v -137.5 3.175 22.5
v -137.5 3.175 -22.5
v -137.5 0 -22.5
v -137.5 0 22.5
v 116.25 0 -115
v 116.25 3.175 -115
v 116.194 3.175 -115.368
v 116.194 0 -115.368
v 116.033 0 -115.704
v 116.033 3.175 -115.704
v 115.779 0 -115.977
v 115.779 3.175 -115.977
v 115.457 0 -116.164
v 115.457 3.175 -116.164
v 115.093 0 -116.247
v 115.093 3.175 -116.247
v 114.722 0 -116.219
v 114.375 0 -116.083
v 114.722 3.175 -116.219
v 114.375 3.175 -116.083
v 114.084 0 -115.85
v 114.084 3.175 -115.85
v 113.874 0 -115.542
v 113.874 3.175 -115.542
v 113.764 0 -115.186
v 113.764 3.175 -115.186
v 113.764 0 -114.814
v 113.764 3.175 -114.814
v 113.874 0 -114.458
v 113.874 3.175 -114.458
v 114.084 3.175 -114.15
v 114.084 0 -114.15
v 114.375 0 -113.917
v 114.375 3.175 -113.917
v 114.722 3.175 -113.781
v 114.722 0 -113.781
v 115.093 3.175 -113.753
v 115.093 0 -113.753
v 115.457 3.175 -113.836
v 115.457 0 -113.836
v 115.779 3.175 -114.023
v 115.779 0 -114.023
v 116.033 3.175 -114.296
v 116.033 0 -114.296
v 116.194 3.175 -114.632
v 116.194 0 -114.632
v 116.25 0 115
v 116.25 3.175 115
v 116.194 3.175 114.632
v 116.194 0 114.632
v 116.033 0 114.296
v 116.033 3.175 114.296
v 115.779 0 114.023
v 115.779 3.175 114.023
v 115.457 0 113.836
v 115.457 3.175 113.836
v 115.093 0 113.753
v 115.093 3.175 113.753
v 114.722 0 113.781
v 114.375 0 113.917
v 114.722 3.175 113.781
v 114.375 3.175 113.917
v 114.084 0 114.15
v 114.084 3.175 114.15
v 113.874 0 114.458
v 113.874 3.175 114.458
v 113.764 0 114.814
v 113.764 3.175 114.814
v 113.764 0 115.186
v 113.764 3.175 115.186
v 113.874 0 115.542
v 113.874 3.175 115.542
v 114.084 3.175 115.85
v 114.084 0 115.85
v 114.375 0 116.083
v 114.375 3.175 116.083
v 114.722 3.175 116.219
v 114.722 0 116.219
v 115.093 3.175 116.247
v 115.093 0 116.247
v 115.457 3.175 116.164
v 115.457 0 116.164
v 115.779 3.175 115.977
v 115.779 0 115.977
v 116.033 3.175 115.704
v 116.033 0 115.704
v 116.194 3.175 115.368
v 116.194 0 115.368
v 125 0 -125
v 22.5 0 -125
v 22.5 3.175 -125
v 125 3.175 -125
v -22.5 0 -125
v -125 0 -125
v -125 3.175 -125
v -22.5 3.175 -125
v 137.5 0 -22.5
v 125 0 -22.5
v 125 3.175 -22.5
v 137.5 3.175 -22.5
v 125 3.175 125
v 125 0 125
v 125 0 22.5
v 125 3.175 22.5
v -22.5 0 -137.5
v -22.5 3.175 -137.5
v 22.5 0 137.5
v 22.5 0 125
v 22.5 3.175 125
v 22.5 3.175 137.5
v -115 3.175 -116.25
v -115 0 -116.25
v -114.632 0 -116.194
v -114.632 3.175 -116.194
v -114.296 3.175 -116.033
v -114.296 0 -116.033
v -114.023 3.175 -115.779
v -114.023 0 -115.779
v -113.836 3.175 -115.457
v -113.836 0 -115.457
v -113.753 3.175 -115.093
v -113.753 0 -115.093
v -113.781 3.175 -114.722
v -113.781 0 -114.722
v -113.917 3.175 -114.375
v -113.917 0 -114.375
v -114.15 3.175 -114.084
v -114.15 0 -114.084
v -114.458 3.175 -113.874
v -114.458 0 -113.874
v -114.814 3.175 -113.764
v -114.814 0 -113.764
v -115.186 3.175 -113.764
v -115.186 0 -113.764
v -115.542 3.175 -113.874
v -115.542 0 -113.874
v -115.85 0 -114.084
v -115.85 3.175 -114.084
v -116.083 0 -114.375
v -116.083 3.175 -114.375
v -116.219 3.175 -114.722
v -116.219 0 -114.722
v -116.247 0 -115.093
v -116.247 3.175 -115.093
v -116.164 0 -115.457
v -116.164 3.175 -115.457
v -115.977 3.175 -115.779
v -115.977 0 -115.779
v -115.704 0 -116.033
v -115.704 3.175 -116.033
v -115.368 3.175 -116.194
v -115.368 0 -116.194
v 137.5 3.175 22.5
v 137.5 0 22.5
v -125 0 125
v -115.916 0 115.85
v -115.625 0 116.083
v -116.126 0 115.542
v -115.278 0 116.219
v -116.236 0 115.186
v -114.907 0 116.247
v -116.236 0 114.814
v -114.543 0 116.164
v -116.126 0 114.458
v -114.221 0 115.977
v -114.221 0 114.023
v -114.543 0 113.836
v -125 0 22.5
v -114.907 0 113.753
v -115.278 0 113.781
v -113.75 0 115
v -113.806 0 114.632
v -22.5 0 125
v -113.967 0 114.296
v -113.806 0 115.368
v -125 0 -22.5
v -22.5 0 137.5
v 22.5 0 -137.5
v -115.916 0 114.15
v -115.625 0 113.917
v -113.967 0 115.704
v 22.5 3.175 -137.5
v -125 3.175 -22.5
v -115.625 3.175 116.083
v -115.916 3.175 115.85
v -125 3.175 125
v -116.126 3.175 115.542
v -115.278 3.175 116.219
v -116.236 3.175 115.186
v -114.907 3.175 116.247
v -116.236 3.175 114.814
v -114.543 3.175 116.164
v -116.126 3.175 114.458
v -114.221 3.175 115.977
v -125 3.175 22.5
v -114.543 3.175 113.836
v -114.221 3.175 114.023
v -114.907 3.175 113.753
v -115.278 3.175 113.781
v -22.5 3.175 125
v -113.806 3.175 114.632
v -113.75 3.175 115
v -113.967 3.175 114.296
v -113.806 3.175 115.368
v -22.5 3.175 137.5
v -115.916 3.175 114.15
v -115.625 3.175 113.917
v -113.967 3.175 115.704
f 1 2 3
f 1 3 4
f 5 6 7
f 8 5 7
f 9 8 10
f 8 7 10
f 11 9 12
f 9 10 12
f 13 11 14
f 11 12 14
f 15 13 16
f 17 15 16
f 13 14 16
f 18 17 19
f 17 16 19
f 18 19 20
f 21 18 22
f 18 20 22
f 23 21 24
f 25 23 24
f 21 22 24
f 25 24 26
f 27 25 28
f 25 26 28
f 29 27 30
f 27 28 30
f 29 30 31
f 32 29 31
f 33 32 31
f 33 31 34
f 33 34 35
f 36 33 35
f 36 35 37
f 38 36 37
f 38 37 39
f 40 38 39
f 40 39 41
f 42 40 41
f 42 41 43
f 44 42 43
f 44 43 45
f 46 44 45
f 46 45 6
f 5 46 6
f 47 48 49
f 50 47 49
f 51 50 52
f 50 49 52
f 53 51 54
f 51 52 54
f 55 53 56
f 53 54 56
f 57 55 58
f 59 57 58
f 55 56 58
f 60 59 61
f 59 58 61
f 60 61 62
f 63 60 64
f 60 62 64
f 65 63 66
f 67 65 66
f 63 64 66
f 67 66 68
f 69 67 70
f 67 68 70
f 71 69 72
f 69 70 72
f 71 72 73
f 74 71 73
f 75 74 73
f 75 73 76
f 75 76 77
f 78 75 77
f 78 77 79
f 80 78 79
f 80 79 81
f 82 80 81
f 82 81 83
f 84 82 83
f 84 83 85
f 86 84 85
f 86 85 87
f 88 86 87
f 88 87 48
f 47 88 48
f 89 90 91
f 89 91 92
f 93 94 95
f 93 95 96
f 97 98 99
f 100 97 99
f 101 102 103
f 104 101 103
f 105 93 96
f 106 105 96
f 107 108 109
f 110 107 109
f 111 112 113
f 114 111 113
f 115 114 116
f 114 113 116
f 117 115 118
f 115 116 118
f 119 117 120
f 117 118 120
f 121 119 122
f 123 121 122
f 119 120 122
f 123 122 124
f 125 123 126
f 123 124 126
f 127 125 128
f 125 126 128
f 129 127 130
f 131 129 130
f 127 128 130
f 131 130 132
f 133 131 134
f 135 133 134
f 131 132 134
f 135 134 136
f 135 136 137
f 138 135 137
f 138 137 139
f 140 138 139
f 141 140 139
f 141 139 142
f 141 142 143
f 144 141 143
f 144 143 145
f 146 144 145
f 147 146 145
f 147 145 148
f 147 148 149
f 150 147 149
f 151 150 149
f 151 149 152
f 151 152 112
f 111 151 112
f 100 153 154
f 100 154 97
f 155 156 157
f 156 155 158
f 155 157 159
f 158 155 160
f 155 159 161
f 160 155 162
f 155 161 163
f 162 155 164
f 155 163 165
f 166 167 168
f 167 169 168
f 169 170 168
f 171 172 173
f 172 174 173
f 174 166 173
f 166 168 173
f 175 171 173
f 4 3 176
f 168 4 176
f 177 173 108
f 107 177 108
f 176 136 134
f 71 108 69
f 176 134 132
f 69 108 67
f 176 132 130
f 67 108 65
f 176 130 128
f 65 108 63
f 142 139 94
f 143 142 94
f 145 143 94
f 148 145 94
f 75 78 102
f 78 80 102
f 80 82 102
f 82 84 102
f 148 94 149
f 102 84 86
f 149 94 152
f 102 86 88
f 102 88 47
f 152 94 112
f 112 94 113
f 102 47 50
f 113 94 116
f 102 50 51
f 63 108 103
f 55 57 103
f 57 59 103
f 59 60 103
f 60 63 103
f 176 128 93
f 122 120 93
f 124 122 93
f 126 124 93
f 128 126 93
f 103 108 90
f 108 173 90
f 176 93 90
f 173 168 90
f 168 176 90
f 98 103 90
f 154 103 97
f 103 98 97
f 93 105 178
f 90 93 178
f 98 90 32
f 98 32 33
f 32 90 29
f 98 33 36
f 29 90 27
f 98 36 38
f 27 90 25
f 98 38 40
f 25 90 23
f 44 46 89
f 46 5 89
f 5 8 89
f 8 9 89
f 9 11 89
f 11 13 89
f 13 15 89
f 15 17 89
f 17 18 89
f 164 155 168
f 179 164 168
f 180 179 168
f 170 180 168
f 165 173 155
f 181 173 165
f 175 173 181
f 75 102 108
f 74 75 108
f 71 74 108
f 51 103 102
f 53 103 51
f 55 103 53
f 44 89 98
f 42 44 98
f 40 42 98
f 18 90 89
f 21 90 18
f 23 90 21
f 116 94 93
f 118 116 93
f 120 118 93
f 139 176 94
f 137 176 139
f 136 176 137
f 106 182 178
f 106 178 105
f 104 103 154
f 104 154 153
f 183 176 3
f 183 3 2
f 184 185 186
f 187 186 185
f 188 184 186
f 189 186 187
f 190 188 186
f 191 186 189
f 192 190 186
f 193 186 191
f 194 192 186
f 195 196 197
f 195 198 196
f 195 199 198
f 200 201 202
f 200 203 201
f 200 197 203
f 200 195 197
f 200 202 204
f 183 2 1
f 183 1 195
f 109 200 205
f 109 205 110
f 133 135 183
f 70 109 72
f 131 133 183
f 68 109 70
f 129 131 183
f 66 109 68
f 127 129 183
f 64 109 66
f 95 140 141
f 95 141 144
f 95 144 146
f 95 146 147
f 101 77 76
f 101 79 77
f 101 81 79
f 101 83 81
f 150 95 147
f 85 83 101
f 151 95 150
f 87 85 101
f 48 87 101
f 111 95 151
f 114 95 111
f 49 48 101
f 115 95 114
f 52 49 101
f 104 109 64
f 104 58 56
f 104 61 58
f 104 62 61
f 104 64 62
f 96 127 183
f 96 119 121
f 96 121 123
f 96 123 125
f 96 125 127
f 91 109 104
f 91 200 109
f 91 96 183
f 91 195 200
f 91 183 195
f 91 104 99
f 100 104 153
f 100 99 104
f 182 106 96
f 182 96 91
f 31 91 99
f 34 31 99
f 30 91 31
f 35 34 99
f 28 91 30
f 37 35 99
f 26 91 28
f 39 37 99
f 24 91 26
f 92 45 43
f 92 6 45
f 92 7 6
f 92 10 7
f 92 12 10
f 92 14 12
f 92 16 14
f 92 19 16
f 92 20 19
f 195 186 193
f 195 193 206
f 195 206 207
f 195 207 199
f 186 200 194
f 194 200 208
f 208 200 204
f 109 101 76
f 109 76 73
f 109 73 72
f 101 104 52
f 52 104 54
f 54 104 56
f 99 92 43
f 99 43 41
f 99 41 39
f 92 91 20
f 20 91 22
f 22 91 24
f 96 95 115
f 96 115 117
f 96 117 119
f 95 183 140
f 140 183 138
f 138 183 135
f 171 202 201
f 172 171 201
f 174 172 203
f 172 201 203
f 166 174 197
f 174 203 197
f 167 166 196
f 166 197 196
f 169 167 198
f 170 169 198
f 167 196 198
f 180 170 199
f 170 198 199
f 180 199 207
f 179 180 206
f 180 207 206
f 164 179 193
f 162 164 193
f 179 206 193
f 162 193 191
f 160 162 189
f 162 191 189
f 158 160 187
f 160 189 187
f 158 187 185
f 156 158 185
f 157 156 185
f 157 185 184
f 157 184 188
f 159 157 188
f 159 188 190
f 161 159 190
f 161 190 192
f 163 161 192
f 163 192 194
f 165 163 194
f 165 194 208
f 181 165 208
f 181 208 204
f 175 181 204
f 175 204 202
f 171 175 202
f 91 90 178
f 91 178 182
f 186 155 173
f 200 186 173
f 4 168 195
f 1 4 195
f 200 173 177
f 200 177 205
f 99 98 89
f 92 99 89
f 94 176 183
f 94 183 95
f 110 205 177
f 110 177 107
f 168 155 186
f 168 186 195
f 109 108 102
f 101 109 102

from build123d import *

# Parameters (mm, degrees)
SKETCH2_W              = 250
SKETCH2_H              = 250
BASE_DEPTH             = 3.175
SKETCH10_W             = 45
SKETCH10_H             = 3.175
JIGSAW1_DEPTH          = 12.5
SKETCH11_W             = 45
SKETCH11_H             = 3.175
JIGSAW2_DEPTH          = 12.5
SKETCH13_W             = 45
SKETCH13_H             = 3.175
JIGSAW3_DEPTH          = 12.5
SKETCH14_W             = 45
SKETCH14_H             = 3.175
JIGSAW4_DEPTH          = 12.5
STANDOFF_HOLES_D       = 2.5
SKETCH21_R             = 1.25
STANDOFF_HOLES_2_DEPTH = 10


with BuildPart() as part:
    # Sketch2 → Base (new body)
    with BuildSketch(Plane(origin=(0, 0, 0), x_dir=(1, 0, 0), z_dir=(0, 1, 0))):
        Rectangle(SKETCH2_W, SKETCH2_H)
    extrude(amount=BASE_DEPTH)

    # Sketch10 → Jigsaw1 (add)
    with BuildSketch(Plane(origin=(0, 0, -125), x_dir=(-1, 0, 0), z_dir=(0, 0, -1))):
        with Locations((0, 1.5875)):
            Rectangle(SKETCH10_W, SKETCH10_H)
    extrude(amount=JIGSAW1_DEPTH)

    # Sketch11 → Jigsaw2 (add)
    with BuildSketch(Plane.ZY.offset(125)):
        with Locations((0, 1.5875)):
            Rectangle(SKETCH11_W, SKETCH11_H)
    extrude(amount=JIGSAW2_DEPTH)

    # Sketch13 → Jigsaw3 (add)
    with BuildSketch(Plane.XY.offset(125)):
        with Locations((0, 1.5875)):
            Rectangle(SKETCH13_W, SKETCH13_H)
    extrude(amount=JIGSAW3_DEPTH)

    # Sketch14 → Jigsaw4 (add)
    with BuildSketch(Plane(origin=(125, 0, 0), x_dir=(0, 0, -1), z_dir=(1, 0, 0))):
        with Locations((0, 1.5875)):
            Rectangle(SKETCH14_W, SKETCH14_H)
    extrude(amount=JIGSAW4_DEPTH)

    # Standoff Holes (through all)
    with Locations(Plane(origin=(-115, 3.175, -115), x_dir=(0, 0, 1), z_dir=(0, 1, 0))):
        with Locations((0, 0)):
            Hole(STANDOFF_HOLES_D / 2)

    # Sketch21 → Standoff Holes 2 (cut)
    with BuildSketch(Plane(origin=(0, 3.175, 0), x_dir=(1, 0, 0), z_dir=(0, 1, 0))):
        with Locations((115, 115)):
            Circle(SKETCH21_R)
        with Locations((115, -115)):
            Circle(SKETCH21_R)
        with Locations((-115, -115)):
            Circle(SKETCH21_R)
    extrude(amount=-STANDOFF_HOLES_2_DEPTH, mode=Mode.SUBTRACT)


solid = part.part
